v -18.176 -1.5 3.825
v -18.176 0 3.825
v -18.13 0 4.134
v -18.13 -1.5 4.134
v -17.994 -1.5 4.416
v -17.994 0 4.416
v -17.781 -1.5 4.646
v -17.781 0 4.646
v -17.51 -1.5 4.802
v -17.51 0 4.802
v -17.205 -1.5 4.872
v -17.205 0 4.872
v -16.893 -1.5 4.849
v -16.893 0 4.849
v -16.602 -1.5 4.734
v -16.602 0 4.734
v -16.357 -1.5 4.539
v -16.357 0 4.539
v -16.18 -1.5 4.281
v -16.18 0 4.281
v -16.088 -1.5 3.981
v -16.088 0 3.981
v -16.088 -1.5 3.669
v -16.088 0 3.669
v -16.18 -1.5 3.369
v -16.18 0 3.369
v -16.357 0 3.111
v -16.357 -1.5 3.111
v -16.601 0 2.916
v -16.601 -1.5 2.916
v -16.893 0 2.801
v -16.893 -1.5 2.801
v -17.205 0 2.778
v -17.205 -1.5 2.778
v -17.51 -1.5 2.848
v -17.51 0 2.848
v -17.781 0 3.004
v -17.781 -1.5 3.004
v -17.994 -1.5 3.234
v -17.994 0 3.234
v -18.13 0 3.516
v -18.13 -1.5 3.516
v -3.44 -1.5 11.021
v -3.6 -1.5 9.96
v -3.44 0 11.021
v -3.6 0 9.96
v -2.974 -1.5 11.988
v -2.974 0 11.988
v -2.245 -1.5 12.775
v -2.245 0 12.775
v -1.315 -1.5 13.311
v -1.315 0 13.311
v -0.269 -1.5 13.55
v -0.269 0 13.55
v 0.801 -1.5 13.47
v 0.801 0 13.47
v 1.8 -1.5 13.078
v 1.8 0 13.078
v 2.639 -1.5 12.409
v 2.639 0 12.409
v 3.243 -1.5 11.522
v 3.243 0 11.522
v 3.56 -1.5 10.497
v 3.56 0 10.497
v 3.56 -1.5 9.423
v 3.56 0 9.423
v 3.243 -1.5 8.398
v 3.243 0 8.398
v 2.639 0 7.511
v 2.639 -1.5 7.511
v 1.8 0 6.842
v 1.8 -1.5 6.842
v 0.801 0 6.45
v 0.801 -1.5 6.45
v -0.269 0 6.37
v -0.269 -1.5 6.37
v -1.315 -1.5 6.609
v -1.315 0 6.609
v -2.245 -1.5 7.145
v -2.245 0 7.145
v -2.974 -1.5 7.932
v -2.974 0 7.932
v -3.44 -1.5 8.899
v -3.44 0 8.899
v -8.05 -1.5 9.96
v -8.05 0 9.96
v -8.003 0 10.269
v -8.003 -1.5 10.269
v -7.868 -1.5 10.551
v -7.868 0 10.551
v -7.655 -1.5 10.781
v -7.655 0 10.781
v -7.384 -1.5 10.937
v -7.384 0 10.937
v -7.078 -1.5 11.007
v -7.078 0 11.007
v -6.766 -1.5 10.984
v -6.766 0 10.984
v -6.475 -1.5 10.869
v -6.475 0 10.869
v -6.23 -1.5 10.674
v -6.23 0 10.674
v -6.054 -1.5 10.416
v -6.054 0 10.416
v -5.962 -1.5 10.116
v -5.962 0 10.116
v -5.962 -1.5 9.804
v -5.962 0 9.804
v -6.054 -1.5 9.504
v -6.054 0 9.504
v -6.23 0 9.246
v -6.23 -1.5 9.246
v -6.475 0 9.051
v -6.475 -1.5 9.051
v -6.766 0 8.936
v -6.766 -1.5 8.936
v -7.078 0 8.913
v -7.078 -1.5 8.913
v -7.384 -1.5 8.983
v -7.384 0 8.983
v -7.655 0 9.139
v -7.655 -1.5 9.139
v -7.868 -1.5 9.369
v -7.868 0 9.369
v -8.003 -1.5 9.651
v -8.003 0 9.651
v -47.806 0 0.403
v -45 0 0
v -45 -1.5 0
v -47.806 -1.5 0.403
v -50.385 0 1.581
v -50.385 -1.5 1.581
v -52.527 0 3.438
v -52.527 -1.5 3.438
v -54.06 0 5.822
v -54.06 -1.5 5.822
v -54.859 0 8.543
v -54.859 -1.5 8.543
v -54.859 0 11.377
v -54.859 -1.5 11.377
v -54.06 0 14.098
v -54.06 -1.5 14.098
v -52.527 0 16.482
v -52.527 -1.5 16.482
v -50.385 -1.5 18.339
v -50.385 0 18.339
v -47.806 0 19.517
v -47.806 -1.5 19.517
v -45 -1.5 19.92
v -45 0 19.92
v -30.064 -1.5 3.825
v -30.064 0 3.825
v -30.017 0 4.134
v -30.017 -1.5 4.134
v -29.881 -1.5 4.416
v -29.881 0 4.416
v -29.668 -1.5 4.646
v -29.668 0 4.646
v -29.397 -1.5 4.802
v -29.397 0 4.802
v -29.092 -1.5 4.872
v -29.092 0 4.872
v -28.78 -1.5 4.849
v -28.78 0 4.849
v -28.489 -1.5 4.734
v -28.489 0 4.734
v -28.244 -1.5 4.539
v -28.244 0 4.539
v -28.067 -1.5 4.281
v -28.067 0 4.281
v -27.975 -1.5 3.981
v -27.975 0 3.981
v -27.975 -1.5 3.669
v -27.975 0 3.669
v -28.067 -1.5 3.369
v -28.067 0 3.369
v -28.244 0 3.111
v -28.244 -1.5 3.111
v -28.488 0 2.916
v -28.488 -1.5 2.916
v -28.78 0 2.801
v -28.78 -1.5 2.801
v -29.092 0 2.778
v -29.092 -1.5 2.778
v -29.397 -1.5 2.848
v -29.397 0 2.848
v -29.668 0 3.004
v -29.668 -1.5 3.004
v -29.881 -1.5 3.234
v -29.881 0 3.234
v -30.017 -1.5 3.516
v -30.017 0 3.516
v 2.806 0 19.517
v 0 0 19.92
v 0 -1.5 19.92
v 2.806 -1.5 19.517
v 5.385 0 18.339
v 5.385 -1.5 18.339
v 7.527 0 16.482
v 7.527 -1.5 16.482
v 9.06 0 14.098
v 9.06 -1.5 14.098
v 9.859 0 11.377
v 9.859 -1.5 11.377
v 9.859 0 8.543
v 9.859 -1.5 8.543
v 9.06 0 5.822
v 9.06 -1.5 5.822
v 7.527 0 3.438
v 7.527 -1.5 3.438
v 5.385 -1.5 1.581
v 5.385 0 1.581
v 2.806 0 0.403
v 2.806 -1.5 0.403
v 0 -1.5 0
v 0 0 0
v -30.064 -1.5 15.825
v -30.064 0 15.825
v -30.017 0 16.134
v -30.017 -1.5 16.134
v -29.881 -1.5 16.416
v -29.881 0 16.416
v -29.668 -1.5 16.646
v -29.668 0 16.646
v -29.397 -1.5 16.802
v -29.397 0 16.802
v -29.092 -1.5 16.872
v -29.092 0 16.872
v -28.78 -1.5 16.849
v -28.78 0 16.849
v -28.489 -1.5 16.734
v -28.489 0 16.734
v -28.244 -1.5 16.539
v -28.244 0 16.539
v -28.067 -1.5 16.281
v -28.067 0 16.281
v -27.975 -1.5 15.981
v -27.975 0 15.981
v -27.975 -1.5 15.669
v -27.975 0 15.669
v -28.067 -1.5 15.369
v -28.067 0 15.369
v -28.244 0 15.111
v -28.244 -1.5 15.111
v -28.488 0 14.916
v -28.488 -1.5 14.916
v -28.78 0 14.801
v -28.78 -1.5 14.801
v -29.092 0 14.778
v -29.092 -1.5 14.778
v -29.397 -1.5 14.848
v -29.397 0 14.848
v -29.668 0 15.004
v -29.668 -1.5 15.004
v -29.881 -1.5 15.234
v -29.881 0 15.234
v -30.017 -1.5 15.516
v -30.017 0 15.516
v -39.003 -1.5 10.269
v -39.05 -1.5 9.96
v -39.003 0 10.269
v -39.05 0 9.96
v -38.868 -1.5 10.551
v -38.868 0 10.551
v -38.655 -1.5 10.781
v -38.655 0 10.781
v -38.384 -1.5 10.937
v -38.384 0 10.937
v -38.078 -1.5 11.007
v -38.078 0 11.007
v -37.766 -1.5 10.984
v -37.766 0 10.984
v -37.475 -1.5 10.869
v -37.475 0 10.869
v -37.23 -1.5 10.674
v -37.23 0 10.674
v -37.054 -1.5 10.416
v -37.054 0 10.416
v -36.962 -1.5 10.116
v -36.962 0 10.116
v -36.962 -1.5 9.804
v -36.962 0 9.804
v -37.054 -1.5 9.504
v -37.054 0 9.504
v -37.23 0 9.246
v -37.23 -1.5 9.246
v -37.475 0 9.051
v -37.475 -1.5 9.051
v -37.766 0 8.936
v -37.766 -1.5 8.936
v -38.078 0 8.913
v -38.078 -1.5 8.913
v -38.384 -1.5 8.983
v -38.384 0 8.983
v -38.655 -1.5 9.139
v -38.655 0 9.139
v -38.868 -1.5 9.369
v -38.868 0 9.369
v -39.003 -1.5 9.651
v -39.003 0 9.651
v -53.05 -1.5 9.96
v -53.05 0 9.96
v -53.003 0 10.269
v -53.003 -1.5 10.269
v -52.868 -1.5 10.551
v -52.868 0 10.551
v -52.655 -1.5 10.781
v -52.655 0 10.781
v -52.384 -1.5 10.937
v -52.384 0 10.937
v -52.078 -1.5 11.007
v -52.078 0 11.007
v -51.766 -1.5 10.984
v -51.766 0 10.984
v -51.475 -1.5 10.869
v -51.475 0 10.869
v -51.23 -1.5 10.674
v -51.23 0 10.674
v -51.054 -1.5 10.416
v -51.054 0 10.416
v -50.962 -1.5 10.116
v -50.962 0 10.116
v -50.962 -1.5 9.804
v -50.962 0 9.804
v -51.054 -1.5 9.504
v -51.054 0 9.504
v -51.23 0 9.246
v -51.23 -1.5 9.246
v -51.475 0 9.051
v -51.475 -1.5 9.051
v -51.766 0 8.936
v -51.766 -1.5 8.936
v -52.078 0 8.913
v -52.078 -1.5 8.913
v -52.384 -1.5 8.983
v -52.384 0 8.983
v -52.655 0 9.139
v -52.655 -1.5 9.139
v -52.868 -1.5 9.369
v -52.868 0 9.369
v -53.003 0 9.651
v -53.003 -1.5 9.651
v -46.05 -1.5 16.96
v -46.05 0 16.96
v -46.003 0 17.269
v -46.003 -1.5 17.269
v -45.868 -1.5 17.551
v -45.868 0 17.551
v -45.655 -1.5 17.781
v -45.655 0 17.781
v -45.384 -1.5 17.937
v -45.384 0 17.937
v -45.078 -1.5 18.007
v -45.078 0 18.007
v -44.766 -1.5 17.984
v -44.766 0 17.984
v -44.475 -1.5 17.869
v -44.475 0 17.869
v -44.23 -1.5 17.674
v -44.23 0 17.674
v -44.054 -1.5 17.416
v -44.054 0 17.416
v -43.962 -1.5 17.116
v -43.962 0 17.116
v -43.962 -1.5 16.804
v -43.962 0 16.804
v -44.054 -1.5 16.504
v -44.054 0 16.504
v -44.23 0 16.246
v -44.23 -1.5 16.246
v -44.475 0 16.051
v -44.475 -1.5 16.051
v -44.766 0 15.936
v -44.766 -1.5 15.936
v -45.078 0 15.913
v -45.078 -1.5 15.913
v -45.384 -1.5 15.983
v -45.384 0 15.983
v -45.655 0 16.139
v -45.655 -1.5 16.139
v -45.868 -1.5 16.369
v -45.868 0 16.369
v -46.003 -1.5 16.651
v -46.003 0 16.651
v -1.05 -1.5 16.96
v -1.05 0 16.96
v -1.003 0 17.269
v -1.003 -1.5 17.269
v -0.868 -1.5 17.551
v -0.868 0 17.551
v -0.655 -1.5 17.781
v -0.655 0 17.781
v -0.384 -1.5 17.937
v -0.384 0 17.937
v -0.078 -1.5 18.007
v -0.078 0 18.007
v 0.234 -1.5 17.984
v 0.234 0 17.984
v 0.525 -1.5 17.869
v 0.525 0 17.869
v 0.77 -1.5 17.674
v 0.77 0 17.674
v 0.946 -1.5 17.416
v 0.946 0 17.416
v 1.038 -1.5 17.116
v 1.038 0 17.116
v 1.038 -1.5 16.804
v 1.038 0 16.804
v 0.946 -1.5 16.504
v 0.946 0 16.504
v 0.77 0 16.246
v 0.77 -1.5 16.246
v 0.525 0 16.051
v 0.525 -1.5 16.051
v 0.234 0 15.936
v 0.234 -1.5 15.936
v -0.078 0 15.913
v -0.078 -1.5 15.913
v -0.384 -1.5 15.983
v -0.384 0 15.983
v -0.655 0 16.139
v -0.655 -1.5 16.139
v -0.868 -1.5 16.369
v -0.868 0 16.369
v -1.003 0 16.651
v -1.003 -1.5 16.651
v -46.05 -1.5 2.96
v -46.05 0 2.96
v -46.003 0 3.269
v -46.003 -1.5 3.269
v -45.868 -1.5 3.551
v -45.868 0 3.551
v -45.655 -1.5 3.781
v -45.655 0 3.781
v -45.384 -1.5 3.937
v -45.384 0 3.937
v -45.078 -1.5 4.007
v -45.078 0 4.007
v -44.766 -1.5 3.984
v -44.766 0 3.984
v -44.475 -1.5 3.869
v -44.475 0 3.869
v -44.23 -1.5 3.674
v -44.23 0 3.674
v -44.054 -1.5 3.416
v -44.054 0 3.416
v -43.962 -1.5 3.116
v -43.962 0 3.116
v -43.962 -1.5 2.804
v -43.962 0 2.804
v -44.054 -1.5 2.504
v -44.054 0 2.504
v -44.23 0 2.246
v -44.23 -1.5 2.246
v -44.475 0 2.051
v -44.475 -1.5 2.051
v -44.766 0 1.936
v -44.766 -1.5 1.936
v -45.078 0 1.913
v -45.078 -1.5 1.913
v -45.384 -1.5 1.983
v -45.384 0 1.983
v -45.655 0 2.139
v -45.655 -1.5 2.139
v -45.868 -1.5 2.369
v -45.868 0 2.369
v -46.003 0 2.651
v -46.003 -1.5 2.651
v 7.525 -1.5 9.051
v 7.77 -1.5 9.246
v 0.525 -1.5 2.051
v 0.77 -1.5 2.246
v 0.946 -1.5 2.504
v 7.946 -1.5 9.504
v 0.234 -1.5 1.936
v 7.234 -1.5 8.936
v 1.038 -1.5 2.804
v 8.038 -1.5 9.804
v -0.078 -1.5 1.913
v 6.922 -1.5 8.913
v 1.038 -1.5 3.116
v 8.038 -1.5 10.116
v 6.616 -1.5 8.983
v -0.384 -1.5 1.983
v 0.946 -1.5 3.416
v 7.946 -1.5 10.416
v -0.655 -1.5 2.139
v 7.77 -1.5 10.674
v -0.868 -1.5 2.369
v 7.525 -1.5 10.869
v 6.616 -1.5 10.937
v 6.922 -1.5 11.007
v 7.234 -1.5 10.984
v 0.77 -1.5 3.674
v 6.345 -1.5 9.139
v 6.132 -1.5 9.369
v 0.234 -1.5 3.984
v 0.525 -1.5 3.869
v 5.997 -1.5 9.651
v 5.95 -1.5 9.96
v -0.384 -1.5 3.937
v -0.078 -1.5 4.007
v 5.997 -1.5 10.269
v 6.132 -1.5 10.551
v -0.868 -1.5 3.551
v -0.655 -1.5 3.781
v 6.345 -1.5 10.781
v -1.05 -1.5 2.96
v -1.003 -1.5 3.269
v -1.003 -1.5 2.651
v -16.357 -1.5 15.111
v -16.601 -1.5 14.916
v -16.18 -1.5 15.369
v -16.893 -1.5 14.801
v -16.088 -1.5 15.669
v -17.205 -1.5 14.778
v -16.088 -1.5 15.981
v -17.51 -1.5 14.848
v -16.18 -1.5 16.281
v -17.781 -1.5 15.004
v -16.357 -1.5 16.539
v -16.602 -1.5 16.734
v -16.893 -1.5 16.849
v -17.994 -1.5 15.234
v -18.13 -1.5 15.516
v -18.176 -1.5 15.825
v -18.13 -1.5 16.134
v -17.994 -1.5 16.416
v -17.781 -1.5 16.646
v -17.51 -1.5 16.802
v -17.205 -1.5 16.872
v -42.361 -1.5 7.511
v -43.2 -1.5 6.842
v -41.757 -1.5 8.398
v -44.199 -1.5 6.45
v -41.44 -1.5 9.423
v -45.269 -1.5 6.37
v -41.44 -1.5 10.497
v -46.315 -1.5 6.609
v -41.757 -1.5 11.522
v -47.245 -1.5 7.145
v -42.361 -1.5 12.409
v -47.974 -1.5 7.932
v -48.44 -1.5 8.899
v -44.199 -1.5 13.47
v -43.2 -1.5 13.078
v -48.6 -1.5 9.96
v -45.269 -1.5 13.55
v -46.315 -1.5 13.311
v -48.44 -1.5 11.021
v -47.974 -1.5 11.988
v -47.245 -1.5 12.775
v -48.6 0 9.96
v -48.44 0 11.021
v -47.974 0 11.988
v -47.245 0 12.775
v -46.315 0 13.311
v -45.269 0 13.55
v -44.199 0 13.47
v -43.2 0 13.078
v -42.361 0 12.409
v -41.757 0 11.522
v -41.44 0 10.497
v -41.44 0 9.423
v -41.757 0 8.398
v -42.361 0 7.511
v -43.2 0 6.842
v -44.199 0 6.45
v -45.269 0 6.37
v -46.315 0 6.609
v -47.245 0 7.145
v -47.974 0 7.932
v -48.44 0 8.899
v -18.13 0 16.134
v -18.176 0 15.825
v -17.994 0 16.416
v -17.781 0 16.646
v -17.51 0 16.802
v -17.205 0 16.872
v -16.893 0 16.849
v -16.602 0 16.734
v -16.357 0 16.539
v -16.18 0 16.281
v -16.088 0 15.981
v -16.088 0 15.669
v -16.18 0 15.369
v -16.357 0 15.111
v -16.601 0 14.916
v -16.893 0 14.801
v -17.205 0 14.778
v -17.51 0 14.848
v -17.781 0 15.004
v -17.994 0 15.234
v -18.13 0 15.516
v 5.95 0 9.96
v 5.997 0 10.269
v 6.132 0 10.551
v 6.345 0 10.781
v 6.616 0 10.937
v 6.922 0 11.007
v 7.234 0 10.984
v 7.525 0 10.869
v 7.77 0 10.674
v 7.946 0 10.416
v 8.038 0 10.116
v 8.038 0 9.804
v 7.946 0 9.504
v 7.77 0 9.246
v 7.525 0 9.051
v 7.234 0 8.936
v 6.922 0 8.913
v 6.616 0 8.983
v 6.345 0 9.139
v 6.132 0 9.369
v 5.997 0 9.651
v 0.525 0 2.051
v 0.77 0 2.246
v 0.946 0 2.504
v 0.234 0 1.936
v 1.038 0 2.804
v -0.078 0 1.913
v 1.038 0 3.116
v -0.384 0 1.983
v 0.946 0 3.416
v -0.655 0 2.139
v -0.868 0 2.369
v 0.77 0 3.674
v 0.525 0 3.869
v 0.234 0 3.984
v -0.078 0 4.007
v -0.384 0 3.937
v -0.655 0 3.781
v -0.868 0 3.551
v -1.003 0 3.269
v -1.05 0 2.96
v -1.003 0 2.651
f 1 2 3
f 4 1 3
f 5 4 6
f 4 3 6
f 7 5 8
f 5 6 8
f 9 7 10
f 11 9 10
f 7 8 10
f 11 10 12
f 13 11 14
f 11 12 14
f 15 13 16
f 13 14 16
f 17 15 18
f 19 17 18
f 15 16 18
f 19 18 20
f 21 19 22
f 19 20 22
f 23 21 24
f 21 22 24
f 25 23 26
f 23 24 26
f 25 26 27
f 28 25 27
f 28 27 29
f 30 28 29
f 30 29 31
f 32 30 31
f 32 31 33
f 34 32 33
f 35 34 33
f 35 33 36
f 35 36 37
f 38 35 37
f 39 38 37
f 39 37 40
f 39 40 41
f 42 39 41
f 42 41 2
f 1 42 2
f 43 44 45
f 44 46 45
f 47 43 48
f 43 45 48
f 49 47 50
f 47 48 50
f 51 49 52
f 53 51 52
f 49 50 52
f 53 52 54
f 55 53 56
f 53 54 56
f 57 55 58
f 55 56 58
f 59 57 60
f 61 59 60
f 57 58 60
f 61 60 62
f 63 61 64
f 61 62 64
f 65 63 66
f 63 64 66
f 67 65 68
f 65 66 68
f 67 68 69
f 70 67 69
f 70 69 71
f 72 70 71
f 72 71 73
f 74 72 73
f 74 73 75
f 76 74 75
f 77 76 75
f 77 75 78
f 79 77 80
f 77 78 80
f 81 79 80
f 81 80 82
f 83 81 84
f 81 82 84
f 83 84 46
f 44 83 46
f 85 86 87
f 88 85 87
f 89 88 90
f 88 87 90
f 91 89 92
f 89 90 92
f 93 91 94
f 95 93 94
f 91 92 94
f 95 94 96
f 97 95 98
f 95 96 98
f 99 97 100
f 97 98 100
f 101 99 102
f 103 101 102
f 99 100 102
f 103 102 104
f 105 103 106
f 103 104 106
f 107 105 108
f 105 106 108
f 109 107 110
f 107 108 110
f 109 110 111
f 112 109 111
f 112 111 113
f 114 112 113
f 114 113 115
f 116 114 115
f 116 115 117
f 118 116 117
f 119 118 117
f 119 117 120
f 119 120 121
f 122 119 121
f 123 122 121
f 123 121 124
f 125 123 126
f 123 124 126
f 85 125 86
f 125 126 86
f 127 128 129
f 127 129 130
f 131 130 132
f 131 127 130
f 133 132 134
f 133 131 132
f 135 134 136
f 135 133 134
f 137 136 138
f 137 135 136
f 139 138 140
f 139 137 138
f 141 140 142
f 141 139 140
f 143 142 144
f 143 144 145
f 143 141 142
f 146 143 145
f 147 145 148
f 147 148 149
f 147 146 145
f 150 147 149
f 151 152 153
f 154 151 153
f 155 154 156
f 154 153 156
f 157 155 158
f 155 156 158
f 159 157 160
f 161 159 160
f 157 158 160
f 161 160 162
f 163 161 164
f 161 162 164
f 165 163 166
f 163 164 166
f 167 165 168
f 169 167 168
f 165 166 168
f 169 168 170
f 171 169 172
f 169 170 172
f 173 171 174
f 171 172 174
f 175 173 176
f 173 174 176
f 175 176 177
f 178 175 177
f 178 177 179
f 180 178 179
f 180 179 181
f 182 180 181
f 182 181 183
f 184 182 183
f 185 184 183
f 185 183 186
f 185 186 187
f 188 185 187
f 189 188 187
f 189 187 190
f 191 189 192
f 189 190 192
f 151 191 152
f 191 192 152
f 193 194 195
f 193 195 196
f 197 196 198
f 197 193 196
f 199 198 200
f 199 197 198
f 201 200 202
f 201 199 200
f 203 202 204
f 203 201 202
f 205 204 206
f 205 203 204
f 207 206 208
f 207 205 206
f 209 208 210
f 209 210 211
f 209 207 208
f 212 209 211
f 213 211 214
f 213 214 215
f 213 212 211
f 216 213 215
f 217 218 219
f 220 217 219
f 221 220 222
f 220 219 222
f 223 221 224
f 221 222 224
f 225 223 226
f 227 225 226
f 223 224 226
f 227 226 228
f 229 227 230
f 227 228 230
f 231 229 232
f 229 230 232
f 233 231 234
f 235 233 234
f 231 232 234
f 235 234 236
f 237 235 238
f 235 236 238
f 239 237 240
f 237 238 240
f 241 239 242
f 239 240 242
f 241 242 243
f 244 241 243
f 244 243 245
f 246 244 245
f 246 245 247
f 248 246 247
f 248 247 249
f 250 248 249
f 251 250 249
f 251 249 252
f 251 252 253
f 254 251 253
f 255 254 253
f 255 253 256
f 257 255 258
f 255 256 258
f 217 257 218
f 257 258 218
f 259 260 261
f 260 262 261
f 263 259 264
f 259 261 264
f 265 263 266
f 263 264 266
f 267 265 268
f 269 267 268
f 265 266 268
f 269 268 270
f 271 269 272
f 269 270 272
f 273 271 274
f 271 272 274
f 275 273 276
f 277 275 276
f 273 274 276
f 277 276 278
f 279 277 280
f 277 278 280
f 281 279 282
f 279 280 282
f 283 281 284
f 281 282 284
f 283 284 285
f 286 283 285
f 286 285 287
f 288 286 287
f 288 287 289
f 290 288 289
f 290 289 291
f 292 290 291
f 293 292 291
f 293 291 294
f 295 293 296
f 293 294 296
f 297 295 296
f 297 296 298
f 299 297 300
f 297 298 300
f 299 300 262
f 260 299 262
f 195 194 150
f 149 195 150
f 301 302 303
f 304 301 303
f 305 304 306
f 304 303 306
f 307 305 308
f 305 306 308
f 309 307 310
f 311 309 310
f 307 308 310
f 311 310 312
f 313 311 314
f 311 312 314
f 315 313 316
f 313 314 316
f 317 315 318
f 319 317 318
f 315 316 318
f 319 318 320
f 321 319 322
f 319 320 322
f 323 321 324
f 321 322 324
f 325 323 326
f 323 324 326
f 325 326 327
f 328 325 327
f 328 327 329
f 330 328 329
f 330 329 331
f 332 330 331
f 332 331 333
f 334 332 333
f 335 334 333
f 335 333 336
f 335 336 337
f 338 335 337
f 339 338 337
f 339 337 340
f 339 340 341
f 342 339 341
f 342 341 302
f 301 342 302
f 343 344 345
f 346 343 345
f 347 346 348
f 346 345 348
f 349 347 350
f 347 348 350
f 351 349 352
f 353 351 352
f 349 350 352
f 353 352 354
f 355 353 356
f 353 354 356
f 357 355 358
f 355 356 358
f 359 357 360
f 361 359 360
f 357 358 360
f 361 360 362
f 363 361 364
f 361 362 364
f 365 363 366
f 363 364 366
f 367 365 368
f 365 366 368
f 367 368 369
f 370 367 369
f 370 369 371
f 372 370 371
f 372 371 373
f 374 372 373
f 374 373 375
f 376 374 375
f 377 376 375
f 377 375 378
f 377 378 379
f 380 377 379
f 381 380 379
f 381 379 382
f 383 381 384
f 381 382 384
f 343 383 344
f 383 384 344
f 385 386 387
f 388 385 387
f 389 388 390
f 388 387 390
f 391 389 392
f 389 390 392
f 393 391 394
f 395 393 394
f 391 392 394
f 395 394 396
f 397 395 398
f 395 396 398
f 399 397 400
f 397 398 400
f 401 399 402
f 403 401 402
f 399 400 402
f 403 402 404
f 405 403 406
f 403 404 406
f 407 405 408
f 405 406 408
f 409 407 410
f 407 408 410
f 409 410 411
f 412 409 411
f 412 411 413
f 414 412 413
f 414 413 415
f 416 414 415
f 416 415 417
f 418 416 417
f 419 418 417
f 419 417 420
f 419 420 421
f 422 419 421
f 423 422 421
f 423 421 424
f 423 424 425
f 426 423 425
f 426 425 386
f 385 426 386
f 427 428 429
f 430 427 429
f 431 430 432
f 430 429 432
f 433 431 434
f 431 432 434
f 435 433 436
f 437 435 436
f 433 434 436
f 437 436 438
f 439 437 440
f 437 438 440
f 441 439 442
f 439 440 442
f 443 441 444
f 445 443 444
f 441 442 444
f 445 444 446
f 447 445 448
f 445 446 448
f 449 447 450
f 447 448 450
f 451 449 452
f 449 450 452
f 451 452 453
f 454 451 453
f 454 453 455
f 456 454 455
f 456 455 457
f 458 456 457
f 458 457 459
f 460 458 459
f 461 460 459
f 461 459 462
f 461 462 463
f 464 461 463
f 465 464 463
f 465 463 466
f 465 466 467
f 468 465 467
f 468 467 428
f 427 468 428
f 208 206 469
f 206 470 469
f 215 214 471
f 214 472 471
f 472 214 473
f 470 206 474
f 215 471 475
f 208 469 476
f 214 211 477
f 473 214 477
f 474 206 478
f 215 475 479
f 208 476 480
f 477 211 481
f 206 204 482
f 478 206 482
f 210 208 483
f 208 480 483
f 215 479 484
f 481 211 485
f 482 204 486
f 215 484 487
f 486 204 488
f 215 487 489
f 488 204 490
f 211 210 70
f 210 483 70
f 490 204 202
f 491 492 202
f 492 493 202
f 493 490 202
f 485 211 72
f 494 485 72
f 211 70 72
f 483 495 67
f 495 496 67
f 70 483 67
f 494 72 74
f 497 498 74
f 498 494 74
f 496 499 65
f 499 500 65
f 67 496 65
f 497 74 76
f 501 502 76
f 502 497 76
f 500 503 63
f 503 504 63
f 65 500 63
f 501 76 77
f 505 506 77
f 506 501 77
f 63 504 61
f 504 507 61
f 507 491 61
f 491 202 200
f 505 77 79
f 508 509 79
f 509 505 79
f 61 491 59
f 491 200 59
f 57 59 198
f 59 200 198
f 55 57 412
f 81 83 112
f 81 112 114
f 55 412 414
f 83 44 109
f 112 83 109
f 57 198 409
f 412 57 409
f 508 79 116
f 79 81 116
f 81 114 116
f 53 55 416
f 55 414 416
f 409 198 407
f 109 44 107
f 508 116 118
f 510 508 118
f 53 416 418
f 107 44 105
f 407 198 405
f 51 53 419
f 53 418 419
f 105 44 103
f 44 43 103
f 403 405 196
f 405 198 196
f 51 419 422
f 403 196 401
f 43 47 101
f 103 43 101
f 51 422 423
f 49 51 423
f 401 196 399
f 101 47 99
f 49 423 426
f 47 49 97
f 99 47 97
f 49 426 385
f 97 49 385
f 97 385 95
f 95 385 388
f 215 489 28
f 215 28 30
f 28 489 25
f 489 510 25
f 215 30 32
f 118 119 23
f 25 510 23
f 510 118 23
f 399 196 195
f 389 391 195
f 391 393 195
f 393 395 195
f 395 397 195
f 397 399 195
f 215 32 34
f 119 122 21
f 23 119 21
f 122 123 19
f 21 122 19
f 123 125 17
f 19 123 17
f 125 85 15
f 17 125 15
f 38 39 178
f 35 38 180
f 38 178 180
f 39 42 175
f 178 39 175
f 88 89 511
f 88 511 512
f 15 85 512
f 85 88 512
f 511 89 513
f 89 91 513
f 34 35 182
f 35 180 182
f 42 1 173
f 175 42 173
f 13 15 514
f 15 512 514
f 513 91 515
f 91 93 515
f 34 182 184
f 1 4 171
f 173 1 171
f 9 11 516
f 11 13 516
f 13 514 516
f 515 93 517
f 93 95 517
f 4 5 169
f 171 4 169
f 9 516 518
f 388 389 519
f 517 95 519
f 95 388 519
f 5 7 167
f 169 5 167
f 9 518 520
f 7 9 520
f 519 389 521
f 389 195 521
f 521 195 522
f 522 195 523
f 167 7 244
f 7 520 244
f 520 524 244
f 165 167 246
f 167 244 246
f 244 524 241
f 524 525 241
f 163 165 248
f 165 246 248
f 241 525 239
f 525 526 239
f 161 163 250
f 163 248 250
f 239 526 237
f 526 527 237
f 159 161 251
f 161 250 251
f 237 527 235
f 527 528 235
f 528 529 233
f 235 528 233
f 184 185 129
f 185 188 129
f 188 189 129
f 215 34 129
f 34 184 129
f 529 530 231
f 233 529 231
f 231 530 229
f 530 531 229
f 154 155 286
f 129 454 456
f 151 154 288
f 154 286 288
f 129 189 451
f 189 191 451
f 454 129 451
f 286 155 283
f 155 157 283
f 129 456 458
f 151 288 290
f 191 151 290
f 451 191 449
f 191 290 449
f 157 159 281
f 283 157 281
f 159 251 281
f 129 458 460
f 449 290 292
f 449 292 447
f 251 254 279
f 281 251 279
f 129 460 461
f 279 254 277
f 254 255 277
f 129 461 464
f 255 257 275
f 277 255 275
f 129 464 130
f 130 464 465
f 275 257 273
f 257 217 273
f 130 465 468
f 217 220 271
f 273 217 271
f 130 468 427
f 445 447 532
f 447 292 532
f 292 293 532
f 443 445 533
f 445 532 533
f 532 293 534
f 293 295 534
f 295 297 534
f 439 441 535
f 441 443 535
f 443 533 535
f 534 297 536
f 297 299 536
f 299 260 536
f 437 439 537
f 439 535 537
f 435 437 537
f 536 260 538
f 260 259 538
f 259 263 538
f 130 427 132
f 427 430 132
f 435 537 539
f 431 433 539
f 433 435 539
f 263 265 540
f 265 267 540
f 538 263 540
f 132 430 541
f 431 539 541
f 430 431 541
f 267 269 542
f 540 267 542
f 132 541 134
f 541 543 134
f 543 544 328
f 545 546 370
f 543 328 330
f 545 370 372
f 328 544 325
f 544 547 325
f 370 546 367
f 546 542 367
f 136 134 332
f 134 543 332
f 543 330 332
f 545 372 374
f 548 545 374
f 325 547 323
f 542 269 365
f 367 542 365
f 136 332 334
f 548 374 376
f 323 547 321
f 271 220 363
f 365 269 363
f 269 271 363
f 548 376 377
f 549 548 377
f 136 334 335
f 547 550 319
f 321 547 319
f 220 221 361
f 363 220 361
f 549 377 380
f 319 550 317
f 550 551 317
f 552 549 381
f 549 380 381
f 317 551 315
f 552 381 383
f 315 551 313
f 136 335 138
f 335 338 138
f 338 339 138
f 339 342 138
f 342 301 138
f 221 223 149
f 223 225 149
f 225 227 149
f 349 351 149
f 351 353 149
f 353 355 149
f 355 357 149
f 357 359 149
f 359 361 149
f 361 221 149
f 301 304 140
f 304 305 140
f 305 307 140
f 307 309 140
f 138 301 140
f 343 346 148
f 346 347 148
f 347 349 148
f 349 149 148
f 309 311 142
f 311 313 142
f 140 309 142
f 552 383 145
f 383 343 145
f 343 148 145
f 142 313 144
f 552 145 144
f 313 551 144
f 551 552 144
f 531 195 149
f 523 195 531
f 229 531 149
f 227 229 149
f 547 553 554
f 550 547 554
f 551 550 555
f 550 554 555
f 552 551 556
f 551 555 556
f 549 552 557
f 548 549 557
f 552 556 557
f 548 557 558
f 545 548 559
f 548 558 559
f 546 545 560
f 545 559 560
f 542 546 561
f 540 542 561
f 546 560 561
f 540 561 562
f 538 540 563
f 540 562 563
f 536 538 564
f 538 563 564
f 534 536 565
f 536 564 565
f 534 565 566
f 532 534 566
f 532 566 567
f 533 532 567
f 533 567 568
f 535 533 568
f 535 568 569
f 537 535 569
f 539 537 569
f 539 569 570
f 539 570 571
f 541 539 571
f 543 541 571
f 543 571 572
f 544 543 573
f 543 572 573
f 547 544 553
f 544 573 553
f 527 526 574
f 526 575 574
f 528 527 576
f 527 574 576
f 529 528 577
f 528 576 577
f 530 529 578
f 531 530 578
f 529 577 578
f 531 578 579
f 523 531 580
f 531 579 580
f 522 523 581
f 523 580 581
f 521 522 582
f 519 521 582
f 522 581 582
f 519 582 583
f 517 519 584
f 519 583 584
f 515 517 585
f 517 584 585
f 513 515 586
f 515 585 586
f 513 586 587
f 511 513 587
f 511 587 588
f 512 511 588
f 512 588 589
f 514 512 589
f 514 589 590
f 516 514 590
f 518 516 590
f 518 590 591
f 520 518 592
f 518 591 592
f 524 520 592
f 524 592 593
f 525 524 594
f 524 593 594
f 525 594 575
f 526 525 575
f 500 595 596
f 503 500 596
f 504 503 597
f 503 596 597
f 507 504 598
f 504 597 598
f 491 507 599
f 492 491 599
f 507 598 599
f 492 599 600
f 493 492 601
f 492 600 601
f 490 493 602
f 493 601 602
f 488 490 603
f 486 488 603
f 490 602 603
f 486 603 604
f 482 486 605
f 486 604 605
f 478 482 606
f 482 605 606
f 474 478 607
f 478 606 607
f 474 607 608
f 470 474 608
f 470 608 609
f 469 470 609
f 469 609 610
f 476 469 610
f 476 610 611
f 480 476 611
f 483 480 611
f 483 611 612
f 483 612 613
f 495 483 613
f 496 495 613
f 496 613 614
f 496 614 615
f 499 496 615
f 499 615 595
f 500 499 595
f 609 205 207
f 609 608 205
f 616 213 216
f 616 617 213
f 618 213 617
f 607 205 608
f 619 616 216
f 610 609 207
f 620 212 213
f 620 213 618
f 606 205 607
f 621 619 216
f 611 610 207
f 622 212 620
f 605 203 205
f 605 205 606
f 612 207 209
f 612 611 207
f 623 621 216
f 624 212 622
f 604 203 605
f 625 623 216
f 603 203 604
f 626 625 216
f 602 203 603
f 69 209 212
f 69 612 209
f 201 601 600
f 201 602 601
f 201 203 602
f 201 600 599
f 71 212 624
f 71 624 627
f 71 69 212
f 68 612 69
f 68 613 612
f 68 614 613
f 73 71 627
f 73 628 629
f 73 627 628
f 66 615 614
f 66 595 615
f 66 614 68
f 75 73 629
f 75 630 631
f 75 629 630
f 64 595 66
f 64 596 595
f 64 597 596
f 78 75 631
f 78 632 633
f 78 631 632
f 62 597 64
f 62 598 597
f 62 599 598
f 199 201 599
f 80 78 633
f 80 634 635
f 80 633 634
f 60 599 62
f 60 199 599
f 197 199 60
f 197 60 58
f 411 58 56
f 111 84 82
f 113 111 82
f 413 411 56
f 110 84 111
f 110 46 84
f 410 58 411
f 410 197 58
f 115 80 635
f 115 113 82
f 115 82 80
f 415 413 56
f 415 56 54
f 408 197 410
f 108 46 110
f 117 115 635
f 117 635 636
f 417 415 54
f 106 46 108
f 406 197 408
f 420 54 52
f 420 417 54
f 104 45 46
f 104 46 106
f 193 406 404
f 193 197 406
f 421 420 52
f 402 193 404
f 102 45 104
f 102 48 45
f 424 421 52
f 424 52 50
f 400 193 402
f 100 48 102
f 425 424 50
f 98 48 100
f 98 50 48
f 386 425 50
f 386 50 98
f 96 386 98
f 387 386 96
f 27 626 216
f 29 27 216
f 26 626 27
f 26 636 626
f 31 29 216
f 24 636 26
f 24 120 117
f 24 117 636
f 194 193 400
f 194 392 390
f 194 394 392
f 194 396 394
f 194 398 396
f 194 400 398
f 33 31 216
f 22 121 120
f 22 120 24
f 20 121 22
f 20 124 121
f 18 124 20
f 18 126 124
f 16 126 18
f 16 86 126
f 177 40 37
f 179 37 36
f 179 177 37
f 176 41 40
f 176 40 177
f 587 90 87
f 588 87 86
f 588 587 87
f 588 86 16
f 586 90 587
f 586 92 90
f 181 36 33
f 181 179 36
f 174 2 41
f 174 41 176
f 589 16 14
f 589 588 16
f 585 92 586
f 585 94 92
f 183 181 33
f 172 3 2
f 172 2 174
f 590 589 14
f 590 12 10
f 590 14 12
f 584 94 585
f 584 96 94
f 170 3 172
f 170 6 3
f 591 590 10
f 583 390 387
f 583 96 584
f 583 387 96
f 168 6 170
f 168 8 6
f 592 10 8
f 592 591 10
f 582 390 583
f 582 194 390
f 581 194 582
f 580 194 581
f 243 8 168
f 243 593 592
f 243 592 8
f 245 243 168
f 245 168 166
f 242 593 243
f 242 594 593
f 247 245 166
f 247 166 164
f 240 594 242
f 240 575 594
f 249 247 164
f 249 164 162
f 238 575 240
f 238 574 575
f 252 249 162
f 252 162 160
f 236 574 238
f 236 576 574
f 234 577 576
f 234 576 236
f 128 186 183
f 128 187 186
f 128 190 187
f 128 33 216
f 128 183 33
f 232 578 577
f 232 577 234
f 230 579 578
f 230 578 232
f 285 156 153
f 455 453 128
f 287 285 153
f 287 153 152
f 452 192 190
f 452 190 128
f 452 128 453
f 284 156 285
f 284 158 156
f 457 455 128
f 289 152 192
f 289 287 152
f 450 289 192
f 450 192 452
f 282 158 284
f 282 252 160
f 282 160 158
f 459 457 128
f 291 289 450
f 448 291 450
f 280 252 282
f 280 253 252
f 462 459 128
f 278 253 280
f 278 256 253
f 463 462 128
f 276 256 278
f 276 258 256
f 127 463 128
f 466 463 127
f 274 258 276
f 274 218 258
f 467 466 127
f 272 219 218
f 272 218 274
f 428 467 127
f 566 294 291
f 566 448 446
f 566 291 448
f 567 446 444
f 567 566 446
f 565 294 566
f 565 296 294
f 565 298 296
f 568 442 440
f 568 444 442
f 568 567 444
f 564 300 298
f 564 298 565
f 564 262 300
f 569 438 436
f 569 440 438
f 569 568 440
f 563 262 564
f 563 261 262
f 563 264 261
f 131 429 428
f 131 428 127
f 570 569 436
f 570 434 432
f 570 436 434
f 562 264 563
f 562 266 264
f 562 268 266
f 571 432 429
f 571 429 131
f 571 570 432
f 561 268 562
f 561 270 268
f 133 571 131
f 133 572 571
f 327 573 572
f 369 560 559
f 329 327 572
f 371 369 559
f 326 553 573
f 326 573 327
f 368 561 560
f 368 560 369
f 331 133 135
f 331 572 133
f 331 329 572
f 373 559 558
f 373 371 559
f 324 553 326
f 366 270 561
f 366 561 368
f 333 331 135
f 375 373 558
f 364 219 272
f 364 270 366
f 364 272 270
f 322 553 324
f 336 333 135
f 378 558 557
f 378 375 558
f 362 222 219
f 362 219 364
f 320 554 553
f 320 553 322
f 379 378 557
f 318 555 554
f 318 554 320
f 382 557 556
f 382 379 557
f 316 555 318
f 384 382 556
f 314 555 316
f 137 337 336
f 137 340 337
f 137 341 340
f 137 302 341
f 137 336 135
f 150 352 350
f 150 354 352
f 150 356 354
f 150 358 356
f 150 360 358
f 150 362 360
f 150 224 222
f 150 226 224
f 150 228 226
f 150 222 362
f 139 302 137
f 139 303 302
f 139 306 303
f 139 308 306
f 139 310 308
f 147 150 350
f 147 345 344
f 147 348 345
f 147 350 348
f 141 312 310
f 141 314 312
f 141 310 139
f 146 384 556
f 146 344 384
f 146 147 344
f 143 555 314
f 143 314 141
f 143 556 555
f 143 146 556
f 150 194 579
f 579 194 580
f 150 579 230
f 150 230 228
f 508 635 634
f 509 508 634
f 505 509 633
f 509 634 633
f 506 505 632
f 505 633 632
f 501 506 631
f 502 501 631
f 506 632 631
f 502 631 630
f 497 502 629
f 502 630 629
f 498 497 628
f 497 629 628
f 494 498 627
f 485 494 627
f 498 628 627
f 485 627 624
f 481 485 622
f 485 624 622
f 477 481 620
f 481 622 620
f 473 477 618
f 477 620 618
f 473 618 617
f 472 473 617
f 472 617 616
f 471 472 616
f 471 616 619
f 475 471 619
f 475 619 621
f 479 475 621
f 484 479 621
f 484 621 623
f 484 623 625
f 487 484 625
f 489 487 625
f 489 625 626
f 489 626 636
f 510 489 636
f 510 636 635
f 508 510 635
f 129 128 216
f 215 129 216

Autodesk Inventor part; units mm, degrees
ref_plane "YZ Plane" through (0, 0, 0) normal (1, 0, 0) x (0, 1, 0)
ref_plane "XZ Plane" through (0, 0, 0) normal (0, 1, 0) x (-1, 0, 0)
ref_plane "XY Plane" through (0, 0, 0) normal (0, 0, 1) x (1, 0, 0)
sketch "Sketch1" plane through (0, 0, 0) normal (0, 1, 0) x (-1, 0, 0)
  circle A0 centre (29.0135, 3.825) radius 1.05
  circle A1 centre (17.1265, 3.825) radius 1.05
  circle A2 centre (17.1265, 15.825) radius 1.05
  circle A3 centre (29.0135, 15.825) radius 1.05
  circle A4 centre (0, 9.96) radius 3.6
  circle A5 centre (45, 9.96) radius 3.6
  circle A6 centre (0, 16.96) radius 1.05
  circle A7 centre (-7, 9.96) radius 1.05
  circle A8 centre (0, 2.96) radius 1.05
  circle A9 centre (7, 9.96) radius 1.05
  circle A10 centre (45, 16.96) radius 1.05
  circle A11 centre (38, 9.96) radius 1.05
  circle A12 centre (45, 2.96) radius 1.05
  circle A13 centre (52, 9.96) radius 1.05
  arc A14 (45, 0) -> (45, 19.92) centre (45, 9.96) ccw
  line L0 (0, 19.92) -> (45, 19.92)
  arc A15 (0, 19.92) -> (0, 0) centre (0, 9.96) ccw
  line L1 (45, 0) -> (0, 0)
  point P0 (0, 0)
extrude "Extrusion1" add sketch "Sketch1" against normal blind 1.5
properties part number "axis_3_bottom_frame(bottom)" material "Aluminum 6061-AHC"
